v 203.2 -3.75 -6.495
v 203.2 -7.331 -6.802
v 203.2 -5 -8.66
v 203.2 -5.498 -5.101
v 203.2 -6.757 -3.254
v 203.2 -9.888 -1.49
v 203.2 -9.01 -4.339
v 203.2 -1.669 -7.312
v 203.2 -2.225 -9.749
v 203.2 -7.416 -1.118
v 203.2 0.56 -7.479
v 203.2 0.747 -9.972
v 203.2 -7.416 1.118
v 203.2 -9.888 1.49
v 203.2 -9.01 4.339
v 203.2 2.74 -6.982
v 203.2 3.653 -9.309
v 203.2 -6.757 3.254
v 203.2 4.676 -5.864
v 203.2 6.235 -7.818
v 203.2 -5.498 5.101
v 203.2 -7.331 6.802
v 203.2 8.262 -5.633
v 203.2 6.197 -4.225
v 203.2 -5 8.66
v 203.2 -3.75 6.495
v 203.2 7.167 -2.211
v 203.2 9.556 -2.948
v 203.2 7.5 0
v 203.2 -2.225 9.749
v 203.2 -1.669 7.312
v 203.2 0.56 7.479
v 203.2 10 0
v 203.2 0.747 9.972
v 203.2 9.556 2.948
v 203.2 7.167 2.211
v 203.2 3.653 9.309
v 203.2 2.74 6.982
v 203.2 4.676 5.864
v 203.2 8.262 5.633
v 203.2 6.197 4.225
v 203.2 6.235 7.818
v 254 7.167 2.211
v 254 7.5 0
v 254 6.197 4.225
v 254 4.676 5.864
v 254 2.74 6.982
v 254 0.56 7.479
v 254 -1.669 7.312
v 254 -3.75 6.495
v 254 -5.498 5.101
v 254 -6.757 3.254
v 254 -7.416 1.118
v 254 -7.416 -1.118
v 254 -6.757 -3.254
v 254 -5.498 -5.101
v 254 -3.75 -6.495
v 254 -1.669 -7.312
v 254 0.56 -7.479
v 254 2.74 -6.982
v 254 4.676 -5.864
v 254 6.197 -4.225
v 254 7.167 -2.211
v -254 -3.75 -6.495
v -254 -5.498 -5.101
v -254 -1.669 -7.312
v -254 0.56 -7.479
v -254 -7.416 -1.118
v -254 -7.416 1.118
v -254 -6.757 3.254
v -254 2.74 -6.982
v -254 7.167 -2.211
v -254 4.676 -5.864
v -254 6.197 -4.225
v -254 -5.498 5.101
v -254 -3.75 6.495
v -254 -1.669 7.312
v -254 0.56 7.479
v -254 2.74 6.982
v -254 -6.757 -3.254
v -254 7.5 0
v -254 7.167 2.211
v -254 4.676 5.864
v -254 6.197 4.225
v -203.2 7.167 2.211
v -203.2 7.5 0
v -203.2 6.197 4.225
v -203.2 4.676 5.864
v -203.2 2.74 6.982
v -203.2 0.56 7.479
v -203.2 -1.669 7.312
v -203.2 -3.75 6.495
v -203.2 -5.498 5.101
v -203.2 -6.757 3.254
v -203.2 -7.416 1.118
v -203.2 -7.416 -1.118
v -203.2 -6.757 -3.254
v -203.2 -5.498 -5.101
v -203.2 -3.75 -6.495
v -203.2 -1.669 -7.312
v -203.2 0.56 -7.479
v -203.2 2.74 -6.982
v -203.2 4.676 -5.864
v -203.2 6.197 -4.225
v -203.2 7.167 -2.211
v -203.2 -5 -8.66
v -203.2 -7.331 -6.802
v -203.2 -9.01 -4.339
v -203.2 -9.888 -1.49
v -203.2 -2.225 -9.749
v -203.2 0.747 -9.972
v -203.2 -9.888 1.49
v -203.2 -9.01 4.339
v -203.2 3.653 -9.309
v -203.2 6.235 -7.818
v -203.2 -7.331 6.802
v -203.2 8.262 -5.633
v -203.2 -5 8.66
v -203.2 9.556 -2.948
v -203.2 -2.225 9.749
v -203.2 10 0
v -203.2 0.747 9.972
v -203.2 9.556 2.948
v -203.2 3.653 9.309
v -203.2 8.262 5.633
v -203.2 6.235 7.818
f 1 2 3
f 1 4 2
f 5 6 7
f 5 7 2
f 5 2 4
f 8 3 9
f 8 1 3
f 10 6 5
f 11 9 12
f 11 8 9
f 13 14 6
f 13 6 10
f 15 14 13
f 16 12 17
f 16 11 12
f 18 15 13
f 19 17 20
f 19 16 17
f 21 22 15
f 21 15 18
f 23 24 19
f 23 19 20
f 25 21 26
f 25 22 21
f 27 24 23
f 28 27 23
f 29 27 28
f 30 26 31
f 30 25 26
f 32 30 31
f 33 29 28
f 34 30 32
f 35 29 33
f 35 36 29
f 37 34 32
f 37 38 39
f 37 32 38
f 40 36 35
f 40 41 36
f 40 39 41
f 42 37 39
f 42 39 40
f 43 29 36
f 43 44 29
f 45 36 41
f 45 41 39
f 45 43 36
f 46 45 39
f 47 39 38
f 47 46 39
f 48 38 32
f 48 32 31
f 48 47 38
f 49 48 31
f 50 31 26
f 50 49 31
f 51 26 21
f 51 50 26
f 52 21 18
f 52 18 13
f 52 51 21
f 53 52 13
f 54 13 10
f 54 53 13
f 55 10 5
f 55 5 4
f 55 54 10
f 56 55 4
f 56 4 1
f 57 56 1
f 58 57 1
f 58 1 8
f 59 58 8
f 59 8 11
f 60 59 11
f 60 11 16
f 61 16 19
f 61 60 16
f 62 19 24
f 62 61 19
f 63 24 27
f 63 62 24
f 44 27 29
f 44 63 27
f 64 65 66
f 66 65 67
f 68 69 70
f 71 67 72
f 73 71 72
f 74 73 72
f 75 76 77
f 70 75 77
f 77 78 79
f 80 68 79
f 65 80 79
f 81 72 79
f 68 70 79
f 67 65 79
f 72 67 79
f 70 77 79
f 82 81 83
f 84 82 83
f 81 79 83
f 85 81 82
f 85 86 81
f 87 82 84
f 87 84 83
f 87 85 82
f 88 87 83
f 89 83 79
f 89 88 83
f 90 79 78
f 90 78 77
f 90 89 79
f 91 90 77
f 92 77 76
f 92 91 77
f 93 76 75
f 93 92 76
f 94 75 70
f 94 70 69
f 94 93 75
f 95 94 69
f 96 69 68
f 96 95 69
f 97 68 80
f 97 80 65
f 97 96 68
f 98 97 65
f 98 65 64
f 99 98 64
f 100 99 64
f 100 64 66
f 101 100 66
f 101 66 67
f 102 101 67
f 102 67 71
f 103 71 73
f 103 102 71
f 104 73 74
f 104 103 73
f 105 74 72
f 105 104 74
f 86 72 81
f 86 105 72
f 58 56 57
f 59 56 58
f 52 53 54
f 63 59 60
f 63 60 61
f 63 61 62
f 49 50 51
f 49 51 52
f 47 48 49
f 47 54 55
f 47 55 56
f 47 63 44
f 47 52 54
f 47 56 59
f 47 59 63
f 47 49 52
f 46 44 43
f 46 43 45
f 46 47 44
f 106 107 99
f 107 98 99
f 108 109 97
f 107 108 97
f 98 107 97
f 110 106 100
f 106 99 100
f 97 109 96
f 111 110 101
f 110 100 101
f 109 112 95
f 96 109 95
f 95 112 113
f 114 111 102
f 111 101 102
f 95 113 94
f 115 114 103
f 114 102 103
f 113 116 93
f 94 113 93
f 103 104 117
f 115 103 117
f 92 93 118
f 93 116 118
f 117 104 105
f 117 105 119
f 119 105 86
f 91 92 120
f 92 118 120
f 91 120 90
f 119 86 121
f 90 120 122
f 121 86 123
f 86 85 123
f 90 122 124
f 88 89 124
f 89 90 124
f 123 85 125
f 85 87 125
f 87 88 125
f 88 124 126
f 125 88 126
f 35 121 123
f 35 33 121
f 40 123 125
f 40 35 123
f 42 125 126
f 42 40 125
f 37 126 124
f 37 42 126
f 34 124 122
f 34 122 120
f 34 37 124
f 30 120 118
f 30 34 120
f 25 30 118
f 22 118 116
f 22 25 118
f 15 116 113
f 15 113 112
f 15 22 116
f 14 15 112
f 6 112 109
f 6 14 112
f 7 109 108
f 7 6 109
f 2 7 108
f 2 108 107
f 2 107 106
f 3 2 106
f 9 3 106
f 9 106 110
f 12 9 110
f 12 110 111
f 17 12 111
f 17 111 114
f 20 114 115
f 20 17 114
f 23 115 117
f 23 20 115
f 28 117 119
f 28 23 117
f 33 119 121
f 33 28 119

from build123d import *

# Parameters (mm, degrees)
F0_R          = 7.5
F2_DEPTH      = 254
F2_DEPTH_BACK = 254
F1_R          = 10
F3_DEPTH      = 203.2
F3_DEPTH_BACK = 203.2


with BuildPart() as f2:
    # F0 (on Right) → F2 (new body, two sides)
    with BuildSketch(Plane.YZ) as f2_sk:
        Circle(F0_R)
    extrude(amount=F2_DEPTH)
    extrude(f2_sk.sketch, amount=-F2_DEPTH_BACK)

    # F1 (on Right) → F3 (join, two sides)
    with BuildSketch(Plane.YZ) as f3_sk:
        Circle(F1_R)
    extrude(amount=F3_DEPTH)
    extrude(f3_sk.sketch, amount=-F3_DEPTH_BACK)


solid = f2.part
